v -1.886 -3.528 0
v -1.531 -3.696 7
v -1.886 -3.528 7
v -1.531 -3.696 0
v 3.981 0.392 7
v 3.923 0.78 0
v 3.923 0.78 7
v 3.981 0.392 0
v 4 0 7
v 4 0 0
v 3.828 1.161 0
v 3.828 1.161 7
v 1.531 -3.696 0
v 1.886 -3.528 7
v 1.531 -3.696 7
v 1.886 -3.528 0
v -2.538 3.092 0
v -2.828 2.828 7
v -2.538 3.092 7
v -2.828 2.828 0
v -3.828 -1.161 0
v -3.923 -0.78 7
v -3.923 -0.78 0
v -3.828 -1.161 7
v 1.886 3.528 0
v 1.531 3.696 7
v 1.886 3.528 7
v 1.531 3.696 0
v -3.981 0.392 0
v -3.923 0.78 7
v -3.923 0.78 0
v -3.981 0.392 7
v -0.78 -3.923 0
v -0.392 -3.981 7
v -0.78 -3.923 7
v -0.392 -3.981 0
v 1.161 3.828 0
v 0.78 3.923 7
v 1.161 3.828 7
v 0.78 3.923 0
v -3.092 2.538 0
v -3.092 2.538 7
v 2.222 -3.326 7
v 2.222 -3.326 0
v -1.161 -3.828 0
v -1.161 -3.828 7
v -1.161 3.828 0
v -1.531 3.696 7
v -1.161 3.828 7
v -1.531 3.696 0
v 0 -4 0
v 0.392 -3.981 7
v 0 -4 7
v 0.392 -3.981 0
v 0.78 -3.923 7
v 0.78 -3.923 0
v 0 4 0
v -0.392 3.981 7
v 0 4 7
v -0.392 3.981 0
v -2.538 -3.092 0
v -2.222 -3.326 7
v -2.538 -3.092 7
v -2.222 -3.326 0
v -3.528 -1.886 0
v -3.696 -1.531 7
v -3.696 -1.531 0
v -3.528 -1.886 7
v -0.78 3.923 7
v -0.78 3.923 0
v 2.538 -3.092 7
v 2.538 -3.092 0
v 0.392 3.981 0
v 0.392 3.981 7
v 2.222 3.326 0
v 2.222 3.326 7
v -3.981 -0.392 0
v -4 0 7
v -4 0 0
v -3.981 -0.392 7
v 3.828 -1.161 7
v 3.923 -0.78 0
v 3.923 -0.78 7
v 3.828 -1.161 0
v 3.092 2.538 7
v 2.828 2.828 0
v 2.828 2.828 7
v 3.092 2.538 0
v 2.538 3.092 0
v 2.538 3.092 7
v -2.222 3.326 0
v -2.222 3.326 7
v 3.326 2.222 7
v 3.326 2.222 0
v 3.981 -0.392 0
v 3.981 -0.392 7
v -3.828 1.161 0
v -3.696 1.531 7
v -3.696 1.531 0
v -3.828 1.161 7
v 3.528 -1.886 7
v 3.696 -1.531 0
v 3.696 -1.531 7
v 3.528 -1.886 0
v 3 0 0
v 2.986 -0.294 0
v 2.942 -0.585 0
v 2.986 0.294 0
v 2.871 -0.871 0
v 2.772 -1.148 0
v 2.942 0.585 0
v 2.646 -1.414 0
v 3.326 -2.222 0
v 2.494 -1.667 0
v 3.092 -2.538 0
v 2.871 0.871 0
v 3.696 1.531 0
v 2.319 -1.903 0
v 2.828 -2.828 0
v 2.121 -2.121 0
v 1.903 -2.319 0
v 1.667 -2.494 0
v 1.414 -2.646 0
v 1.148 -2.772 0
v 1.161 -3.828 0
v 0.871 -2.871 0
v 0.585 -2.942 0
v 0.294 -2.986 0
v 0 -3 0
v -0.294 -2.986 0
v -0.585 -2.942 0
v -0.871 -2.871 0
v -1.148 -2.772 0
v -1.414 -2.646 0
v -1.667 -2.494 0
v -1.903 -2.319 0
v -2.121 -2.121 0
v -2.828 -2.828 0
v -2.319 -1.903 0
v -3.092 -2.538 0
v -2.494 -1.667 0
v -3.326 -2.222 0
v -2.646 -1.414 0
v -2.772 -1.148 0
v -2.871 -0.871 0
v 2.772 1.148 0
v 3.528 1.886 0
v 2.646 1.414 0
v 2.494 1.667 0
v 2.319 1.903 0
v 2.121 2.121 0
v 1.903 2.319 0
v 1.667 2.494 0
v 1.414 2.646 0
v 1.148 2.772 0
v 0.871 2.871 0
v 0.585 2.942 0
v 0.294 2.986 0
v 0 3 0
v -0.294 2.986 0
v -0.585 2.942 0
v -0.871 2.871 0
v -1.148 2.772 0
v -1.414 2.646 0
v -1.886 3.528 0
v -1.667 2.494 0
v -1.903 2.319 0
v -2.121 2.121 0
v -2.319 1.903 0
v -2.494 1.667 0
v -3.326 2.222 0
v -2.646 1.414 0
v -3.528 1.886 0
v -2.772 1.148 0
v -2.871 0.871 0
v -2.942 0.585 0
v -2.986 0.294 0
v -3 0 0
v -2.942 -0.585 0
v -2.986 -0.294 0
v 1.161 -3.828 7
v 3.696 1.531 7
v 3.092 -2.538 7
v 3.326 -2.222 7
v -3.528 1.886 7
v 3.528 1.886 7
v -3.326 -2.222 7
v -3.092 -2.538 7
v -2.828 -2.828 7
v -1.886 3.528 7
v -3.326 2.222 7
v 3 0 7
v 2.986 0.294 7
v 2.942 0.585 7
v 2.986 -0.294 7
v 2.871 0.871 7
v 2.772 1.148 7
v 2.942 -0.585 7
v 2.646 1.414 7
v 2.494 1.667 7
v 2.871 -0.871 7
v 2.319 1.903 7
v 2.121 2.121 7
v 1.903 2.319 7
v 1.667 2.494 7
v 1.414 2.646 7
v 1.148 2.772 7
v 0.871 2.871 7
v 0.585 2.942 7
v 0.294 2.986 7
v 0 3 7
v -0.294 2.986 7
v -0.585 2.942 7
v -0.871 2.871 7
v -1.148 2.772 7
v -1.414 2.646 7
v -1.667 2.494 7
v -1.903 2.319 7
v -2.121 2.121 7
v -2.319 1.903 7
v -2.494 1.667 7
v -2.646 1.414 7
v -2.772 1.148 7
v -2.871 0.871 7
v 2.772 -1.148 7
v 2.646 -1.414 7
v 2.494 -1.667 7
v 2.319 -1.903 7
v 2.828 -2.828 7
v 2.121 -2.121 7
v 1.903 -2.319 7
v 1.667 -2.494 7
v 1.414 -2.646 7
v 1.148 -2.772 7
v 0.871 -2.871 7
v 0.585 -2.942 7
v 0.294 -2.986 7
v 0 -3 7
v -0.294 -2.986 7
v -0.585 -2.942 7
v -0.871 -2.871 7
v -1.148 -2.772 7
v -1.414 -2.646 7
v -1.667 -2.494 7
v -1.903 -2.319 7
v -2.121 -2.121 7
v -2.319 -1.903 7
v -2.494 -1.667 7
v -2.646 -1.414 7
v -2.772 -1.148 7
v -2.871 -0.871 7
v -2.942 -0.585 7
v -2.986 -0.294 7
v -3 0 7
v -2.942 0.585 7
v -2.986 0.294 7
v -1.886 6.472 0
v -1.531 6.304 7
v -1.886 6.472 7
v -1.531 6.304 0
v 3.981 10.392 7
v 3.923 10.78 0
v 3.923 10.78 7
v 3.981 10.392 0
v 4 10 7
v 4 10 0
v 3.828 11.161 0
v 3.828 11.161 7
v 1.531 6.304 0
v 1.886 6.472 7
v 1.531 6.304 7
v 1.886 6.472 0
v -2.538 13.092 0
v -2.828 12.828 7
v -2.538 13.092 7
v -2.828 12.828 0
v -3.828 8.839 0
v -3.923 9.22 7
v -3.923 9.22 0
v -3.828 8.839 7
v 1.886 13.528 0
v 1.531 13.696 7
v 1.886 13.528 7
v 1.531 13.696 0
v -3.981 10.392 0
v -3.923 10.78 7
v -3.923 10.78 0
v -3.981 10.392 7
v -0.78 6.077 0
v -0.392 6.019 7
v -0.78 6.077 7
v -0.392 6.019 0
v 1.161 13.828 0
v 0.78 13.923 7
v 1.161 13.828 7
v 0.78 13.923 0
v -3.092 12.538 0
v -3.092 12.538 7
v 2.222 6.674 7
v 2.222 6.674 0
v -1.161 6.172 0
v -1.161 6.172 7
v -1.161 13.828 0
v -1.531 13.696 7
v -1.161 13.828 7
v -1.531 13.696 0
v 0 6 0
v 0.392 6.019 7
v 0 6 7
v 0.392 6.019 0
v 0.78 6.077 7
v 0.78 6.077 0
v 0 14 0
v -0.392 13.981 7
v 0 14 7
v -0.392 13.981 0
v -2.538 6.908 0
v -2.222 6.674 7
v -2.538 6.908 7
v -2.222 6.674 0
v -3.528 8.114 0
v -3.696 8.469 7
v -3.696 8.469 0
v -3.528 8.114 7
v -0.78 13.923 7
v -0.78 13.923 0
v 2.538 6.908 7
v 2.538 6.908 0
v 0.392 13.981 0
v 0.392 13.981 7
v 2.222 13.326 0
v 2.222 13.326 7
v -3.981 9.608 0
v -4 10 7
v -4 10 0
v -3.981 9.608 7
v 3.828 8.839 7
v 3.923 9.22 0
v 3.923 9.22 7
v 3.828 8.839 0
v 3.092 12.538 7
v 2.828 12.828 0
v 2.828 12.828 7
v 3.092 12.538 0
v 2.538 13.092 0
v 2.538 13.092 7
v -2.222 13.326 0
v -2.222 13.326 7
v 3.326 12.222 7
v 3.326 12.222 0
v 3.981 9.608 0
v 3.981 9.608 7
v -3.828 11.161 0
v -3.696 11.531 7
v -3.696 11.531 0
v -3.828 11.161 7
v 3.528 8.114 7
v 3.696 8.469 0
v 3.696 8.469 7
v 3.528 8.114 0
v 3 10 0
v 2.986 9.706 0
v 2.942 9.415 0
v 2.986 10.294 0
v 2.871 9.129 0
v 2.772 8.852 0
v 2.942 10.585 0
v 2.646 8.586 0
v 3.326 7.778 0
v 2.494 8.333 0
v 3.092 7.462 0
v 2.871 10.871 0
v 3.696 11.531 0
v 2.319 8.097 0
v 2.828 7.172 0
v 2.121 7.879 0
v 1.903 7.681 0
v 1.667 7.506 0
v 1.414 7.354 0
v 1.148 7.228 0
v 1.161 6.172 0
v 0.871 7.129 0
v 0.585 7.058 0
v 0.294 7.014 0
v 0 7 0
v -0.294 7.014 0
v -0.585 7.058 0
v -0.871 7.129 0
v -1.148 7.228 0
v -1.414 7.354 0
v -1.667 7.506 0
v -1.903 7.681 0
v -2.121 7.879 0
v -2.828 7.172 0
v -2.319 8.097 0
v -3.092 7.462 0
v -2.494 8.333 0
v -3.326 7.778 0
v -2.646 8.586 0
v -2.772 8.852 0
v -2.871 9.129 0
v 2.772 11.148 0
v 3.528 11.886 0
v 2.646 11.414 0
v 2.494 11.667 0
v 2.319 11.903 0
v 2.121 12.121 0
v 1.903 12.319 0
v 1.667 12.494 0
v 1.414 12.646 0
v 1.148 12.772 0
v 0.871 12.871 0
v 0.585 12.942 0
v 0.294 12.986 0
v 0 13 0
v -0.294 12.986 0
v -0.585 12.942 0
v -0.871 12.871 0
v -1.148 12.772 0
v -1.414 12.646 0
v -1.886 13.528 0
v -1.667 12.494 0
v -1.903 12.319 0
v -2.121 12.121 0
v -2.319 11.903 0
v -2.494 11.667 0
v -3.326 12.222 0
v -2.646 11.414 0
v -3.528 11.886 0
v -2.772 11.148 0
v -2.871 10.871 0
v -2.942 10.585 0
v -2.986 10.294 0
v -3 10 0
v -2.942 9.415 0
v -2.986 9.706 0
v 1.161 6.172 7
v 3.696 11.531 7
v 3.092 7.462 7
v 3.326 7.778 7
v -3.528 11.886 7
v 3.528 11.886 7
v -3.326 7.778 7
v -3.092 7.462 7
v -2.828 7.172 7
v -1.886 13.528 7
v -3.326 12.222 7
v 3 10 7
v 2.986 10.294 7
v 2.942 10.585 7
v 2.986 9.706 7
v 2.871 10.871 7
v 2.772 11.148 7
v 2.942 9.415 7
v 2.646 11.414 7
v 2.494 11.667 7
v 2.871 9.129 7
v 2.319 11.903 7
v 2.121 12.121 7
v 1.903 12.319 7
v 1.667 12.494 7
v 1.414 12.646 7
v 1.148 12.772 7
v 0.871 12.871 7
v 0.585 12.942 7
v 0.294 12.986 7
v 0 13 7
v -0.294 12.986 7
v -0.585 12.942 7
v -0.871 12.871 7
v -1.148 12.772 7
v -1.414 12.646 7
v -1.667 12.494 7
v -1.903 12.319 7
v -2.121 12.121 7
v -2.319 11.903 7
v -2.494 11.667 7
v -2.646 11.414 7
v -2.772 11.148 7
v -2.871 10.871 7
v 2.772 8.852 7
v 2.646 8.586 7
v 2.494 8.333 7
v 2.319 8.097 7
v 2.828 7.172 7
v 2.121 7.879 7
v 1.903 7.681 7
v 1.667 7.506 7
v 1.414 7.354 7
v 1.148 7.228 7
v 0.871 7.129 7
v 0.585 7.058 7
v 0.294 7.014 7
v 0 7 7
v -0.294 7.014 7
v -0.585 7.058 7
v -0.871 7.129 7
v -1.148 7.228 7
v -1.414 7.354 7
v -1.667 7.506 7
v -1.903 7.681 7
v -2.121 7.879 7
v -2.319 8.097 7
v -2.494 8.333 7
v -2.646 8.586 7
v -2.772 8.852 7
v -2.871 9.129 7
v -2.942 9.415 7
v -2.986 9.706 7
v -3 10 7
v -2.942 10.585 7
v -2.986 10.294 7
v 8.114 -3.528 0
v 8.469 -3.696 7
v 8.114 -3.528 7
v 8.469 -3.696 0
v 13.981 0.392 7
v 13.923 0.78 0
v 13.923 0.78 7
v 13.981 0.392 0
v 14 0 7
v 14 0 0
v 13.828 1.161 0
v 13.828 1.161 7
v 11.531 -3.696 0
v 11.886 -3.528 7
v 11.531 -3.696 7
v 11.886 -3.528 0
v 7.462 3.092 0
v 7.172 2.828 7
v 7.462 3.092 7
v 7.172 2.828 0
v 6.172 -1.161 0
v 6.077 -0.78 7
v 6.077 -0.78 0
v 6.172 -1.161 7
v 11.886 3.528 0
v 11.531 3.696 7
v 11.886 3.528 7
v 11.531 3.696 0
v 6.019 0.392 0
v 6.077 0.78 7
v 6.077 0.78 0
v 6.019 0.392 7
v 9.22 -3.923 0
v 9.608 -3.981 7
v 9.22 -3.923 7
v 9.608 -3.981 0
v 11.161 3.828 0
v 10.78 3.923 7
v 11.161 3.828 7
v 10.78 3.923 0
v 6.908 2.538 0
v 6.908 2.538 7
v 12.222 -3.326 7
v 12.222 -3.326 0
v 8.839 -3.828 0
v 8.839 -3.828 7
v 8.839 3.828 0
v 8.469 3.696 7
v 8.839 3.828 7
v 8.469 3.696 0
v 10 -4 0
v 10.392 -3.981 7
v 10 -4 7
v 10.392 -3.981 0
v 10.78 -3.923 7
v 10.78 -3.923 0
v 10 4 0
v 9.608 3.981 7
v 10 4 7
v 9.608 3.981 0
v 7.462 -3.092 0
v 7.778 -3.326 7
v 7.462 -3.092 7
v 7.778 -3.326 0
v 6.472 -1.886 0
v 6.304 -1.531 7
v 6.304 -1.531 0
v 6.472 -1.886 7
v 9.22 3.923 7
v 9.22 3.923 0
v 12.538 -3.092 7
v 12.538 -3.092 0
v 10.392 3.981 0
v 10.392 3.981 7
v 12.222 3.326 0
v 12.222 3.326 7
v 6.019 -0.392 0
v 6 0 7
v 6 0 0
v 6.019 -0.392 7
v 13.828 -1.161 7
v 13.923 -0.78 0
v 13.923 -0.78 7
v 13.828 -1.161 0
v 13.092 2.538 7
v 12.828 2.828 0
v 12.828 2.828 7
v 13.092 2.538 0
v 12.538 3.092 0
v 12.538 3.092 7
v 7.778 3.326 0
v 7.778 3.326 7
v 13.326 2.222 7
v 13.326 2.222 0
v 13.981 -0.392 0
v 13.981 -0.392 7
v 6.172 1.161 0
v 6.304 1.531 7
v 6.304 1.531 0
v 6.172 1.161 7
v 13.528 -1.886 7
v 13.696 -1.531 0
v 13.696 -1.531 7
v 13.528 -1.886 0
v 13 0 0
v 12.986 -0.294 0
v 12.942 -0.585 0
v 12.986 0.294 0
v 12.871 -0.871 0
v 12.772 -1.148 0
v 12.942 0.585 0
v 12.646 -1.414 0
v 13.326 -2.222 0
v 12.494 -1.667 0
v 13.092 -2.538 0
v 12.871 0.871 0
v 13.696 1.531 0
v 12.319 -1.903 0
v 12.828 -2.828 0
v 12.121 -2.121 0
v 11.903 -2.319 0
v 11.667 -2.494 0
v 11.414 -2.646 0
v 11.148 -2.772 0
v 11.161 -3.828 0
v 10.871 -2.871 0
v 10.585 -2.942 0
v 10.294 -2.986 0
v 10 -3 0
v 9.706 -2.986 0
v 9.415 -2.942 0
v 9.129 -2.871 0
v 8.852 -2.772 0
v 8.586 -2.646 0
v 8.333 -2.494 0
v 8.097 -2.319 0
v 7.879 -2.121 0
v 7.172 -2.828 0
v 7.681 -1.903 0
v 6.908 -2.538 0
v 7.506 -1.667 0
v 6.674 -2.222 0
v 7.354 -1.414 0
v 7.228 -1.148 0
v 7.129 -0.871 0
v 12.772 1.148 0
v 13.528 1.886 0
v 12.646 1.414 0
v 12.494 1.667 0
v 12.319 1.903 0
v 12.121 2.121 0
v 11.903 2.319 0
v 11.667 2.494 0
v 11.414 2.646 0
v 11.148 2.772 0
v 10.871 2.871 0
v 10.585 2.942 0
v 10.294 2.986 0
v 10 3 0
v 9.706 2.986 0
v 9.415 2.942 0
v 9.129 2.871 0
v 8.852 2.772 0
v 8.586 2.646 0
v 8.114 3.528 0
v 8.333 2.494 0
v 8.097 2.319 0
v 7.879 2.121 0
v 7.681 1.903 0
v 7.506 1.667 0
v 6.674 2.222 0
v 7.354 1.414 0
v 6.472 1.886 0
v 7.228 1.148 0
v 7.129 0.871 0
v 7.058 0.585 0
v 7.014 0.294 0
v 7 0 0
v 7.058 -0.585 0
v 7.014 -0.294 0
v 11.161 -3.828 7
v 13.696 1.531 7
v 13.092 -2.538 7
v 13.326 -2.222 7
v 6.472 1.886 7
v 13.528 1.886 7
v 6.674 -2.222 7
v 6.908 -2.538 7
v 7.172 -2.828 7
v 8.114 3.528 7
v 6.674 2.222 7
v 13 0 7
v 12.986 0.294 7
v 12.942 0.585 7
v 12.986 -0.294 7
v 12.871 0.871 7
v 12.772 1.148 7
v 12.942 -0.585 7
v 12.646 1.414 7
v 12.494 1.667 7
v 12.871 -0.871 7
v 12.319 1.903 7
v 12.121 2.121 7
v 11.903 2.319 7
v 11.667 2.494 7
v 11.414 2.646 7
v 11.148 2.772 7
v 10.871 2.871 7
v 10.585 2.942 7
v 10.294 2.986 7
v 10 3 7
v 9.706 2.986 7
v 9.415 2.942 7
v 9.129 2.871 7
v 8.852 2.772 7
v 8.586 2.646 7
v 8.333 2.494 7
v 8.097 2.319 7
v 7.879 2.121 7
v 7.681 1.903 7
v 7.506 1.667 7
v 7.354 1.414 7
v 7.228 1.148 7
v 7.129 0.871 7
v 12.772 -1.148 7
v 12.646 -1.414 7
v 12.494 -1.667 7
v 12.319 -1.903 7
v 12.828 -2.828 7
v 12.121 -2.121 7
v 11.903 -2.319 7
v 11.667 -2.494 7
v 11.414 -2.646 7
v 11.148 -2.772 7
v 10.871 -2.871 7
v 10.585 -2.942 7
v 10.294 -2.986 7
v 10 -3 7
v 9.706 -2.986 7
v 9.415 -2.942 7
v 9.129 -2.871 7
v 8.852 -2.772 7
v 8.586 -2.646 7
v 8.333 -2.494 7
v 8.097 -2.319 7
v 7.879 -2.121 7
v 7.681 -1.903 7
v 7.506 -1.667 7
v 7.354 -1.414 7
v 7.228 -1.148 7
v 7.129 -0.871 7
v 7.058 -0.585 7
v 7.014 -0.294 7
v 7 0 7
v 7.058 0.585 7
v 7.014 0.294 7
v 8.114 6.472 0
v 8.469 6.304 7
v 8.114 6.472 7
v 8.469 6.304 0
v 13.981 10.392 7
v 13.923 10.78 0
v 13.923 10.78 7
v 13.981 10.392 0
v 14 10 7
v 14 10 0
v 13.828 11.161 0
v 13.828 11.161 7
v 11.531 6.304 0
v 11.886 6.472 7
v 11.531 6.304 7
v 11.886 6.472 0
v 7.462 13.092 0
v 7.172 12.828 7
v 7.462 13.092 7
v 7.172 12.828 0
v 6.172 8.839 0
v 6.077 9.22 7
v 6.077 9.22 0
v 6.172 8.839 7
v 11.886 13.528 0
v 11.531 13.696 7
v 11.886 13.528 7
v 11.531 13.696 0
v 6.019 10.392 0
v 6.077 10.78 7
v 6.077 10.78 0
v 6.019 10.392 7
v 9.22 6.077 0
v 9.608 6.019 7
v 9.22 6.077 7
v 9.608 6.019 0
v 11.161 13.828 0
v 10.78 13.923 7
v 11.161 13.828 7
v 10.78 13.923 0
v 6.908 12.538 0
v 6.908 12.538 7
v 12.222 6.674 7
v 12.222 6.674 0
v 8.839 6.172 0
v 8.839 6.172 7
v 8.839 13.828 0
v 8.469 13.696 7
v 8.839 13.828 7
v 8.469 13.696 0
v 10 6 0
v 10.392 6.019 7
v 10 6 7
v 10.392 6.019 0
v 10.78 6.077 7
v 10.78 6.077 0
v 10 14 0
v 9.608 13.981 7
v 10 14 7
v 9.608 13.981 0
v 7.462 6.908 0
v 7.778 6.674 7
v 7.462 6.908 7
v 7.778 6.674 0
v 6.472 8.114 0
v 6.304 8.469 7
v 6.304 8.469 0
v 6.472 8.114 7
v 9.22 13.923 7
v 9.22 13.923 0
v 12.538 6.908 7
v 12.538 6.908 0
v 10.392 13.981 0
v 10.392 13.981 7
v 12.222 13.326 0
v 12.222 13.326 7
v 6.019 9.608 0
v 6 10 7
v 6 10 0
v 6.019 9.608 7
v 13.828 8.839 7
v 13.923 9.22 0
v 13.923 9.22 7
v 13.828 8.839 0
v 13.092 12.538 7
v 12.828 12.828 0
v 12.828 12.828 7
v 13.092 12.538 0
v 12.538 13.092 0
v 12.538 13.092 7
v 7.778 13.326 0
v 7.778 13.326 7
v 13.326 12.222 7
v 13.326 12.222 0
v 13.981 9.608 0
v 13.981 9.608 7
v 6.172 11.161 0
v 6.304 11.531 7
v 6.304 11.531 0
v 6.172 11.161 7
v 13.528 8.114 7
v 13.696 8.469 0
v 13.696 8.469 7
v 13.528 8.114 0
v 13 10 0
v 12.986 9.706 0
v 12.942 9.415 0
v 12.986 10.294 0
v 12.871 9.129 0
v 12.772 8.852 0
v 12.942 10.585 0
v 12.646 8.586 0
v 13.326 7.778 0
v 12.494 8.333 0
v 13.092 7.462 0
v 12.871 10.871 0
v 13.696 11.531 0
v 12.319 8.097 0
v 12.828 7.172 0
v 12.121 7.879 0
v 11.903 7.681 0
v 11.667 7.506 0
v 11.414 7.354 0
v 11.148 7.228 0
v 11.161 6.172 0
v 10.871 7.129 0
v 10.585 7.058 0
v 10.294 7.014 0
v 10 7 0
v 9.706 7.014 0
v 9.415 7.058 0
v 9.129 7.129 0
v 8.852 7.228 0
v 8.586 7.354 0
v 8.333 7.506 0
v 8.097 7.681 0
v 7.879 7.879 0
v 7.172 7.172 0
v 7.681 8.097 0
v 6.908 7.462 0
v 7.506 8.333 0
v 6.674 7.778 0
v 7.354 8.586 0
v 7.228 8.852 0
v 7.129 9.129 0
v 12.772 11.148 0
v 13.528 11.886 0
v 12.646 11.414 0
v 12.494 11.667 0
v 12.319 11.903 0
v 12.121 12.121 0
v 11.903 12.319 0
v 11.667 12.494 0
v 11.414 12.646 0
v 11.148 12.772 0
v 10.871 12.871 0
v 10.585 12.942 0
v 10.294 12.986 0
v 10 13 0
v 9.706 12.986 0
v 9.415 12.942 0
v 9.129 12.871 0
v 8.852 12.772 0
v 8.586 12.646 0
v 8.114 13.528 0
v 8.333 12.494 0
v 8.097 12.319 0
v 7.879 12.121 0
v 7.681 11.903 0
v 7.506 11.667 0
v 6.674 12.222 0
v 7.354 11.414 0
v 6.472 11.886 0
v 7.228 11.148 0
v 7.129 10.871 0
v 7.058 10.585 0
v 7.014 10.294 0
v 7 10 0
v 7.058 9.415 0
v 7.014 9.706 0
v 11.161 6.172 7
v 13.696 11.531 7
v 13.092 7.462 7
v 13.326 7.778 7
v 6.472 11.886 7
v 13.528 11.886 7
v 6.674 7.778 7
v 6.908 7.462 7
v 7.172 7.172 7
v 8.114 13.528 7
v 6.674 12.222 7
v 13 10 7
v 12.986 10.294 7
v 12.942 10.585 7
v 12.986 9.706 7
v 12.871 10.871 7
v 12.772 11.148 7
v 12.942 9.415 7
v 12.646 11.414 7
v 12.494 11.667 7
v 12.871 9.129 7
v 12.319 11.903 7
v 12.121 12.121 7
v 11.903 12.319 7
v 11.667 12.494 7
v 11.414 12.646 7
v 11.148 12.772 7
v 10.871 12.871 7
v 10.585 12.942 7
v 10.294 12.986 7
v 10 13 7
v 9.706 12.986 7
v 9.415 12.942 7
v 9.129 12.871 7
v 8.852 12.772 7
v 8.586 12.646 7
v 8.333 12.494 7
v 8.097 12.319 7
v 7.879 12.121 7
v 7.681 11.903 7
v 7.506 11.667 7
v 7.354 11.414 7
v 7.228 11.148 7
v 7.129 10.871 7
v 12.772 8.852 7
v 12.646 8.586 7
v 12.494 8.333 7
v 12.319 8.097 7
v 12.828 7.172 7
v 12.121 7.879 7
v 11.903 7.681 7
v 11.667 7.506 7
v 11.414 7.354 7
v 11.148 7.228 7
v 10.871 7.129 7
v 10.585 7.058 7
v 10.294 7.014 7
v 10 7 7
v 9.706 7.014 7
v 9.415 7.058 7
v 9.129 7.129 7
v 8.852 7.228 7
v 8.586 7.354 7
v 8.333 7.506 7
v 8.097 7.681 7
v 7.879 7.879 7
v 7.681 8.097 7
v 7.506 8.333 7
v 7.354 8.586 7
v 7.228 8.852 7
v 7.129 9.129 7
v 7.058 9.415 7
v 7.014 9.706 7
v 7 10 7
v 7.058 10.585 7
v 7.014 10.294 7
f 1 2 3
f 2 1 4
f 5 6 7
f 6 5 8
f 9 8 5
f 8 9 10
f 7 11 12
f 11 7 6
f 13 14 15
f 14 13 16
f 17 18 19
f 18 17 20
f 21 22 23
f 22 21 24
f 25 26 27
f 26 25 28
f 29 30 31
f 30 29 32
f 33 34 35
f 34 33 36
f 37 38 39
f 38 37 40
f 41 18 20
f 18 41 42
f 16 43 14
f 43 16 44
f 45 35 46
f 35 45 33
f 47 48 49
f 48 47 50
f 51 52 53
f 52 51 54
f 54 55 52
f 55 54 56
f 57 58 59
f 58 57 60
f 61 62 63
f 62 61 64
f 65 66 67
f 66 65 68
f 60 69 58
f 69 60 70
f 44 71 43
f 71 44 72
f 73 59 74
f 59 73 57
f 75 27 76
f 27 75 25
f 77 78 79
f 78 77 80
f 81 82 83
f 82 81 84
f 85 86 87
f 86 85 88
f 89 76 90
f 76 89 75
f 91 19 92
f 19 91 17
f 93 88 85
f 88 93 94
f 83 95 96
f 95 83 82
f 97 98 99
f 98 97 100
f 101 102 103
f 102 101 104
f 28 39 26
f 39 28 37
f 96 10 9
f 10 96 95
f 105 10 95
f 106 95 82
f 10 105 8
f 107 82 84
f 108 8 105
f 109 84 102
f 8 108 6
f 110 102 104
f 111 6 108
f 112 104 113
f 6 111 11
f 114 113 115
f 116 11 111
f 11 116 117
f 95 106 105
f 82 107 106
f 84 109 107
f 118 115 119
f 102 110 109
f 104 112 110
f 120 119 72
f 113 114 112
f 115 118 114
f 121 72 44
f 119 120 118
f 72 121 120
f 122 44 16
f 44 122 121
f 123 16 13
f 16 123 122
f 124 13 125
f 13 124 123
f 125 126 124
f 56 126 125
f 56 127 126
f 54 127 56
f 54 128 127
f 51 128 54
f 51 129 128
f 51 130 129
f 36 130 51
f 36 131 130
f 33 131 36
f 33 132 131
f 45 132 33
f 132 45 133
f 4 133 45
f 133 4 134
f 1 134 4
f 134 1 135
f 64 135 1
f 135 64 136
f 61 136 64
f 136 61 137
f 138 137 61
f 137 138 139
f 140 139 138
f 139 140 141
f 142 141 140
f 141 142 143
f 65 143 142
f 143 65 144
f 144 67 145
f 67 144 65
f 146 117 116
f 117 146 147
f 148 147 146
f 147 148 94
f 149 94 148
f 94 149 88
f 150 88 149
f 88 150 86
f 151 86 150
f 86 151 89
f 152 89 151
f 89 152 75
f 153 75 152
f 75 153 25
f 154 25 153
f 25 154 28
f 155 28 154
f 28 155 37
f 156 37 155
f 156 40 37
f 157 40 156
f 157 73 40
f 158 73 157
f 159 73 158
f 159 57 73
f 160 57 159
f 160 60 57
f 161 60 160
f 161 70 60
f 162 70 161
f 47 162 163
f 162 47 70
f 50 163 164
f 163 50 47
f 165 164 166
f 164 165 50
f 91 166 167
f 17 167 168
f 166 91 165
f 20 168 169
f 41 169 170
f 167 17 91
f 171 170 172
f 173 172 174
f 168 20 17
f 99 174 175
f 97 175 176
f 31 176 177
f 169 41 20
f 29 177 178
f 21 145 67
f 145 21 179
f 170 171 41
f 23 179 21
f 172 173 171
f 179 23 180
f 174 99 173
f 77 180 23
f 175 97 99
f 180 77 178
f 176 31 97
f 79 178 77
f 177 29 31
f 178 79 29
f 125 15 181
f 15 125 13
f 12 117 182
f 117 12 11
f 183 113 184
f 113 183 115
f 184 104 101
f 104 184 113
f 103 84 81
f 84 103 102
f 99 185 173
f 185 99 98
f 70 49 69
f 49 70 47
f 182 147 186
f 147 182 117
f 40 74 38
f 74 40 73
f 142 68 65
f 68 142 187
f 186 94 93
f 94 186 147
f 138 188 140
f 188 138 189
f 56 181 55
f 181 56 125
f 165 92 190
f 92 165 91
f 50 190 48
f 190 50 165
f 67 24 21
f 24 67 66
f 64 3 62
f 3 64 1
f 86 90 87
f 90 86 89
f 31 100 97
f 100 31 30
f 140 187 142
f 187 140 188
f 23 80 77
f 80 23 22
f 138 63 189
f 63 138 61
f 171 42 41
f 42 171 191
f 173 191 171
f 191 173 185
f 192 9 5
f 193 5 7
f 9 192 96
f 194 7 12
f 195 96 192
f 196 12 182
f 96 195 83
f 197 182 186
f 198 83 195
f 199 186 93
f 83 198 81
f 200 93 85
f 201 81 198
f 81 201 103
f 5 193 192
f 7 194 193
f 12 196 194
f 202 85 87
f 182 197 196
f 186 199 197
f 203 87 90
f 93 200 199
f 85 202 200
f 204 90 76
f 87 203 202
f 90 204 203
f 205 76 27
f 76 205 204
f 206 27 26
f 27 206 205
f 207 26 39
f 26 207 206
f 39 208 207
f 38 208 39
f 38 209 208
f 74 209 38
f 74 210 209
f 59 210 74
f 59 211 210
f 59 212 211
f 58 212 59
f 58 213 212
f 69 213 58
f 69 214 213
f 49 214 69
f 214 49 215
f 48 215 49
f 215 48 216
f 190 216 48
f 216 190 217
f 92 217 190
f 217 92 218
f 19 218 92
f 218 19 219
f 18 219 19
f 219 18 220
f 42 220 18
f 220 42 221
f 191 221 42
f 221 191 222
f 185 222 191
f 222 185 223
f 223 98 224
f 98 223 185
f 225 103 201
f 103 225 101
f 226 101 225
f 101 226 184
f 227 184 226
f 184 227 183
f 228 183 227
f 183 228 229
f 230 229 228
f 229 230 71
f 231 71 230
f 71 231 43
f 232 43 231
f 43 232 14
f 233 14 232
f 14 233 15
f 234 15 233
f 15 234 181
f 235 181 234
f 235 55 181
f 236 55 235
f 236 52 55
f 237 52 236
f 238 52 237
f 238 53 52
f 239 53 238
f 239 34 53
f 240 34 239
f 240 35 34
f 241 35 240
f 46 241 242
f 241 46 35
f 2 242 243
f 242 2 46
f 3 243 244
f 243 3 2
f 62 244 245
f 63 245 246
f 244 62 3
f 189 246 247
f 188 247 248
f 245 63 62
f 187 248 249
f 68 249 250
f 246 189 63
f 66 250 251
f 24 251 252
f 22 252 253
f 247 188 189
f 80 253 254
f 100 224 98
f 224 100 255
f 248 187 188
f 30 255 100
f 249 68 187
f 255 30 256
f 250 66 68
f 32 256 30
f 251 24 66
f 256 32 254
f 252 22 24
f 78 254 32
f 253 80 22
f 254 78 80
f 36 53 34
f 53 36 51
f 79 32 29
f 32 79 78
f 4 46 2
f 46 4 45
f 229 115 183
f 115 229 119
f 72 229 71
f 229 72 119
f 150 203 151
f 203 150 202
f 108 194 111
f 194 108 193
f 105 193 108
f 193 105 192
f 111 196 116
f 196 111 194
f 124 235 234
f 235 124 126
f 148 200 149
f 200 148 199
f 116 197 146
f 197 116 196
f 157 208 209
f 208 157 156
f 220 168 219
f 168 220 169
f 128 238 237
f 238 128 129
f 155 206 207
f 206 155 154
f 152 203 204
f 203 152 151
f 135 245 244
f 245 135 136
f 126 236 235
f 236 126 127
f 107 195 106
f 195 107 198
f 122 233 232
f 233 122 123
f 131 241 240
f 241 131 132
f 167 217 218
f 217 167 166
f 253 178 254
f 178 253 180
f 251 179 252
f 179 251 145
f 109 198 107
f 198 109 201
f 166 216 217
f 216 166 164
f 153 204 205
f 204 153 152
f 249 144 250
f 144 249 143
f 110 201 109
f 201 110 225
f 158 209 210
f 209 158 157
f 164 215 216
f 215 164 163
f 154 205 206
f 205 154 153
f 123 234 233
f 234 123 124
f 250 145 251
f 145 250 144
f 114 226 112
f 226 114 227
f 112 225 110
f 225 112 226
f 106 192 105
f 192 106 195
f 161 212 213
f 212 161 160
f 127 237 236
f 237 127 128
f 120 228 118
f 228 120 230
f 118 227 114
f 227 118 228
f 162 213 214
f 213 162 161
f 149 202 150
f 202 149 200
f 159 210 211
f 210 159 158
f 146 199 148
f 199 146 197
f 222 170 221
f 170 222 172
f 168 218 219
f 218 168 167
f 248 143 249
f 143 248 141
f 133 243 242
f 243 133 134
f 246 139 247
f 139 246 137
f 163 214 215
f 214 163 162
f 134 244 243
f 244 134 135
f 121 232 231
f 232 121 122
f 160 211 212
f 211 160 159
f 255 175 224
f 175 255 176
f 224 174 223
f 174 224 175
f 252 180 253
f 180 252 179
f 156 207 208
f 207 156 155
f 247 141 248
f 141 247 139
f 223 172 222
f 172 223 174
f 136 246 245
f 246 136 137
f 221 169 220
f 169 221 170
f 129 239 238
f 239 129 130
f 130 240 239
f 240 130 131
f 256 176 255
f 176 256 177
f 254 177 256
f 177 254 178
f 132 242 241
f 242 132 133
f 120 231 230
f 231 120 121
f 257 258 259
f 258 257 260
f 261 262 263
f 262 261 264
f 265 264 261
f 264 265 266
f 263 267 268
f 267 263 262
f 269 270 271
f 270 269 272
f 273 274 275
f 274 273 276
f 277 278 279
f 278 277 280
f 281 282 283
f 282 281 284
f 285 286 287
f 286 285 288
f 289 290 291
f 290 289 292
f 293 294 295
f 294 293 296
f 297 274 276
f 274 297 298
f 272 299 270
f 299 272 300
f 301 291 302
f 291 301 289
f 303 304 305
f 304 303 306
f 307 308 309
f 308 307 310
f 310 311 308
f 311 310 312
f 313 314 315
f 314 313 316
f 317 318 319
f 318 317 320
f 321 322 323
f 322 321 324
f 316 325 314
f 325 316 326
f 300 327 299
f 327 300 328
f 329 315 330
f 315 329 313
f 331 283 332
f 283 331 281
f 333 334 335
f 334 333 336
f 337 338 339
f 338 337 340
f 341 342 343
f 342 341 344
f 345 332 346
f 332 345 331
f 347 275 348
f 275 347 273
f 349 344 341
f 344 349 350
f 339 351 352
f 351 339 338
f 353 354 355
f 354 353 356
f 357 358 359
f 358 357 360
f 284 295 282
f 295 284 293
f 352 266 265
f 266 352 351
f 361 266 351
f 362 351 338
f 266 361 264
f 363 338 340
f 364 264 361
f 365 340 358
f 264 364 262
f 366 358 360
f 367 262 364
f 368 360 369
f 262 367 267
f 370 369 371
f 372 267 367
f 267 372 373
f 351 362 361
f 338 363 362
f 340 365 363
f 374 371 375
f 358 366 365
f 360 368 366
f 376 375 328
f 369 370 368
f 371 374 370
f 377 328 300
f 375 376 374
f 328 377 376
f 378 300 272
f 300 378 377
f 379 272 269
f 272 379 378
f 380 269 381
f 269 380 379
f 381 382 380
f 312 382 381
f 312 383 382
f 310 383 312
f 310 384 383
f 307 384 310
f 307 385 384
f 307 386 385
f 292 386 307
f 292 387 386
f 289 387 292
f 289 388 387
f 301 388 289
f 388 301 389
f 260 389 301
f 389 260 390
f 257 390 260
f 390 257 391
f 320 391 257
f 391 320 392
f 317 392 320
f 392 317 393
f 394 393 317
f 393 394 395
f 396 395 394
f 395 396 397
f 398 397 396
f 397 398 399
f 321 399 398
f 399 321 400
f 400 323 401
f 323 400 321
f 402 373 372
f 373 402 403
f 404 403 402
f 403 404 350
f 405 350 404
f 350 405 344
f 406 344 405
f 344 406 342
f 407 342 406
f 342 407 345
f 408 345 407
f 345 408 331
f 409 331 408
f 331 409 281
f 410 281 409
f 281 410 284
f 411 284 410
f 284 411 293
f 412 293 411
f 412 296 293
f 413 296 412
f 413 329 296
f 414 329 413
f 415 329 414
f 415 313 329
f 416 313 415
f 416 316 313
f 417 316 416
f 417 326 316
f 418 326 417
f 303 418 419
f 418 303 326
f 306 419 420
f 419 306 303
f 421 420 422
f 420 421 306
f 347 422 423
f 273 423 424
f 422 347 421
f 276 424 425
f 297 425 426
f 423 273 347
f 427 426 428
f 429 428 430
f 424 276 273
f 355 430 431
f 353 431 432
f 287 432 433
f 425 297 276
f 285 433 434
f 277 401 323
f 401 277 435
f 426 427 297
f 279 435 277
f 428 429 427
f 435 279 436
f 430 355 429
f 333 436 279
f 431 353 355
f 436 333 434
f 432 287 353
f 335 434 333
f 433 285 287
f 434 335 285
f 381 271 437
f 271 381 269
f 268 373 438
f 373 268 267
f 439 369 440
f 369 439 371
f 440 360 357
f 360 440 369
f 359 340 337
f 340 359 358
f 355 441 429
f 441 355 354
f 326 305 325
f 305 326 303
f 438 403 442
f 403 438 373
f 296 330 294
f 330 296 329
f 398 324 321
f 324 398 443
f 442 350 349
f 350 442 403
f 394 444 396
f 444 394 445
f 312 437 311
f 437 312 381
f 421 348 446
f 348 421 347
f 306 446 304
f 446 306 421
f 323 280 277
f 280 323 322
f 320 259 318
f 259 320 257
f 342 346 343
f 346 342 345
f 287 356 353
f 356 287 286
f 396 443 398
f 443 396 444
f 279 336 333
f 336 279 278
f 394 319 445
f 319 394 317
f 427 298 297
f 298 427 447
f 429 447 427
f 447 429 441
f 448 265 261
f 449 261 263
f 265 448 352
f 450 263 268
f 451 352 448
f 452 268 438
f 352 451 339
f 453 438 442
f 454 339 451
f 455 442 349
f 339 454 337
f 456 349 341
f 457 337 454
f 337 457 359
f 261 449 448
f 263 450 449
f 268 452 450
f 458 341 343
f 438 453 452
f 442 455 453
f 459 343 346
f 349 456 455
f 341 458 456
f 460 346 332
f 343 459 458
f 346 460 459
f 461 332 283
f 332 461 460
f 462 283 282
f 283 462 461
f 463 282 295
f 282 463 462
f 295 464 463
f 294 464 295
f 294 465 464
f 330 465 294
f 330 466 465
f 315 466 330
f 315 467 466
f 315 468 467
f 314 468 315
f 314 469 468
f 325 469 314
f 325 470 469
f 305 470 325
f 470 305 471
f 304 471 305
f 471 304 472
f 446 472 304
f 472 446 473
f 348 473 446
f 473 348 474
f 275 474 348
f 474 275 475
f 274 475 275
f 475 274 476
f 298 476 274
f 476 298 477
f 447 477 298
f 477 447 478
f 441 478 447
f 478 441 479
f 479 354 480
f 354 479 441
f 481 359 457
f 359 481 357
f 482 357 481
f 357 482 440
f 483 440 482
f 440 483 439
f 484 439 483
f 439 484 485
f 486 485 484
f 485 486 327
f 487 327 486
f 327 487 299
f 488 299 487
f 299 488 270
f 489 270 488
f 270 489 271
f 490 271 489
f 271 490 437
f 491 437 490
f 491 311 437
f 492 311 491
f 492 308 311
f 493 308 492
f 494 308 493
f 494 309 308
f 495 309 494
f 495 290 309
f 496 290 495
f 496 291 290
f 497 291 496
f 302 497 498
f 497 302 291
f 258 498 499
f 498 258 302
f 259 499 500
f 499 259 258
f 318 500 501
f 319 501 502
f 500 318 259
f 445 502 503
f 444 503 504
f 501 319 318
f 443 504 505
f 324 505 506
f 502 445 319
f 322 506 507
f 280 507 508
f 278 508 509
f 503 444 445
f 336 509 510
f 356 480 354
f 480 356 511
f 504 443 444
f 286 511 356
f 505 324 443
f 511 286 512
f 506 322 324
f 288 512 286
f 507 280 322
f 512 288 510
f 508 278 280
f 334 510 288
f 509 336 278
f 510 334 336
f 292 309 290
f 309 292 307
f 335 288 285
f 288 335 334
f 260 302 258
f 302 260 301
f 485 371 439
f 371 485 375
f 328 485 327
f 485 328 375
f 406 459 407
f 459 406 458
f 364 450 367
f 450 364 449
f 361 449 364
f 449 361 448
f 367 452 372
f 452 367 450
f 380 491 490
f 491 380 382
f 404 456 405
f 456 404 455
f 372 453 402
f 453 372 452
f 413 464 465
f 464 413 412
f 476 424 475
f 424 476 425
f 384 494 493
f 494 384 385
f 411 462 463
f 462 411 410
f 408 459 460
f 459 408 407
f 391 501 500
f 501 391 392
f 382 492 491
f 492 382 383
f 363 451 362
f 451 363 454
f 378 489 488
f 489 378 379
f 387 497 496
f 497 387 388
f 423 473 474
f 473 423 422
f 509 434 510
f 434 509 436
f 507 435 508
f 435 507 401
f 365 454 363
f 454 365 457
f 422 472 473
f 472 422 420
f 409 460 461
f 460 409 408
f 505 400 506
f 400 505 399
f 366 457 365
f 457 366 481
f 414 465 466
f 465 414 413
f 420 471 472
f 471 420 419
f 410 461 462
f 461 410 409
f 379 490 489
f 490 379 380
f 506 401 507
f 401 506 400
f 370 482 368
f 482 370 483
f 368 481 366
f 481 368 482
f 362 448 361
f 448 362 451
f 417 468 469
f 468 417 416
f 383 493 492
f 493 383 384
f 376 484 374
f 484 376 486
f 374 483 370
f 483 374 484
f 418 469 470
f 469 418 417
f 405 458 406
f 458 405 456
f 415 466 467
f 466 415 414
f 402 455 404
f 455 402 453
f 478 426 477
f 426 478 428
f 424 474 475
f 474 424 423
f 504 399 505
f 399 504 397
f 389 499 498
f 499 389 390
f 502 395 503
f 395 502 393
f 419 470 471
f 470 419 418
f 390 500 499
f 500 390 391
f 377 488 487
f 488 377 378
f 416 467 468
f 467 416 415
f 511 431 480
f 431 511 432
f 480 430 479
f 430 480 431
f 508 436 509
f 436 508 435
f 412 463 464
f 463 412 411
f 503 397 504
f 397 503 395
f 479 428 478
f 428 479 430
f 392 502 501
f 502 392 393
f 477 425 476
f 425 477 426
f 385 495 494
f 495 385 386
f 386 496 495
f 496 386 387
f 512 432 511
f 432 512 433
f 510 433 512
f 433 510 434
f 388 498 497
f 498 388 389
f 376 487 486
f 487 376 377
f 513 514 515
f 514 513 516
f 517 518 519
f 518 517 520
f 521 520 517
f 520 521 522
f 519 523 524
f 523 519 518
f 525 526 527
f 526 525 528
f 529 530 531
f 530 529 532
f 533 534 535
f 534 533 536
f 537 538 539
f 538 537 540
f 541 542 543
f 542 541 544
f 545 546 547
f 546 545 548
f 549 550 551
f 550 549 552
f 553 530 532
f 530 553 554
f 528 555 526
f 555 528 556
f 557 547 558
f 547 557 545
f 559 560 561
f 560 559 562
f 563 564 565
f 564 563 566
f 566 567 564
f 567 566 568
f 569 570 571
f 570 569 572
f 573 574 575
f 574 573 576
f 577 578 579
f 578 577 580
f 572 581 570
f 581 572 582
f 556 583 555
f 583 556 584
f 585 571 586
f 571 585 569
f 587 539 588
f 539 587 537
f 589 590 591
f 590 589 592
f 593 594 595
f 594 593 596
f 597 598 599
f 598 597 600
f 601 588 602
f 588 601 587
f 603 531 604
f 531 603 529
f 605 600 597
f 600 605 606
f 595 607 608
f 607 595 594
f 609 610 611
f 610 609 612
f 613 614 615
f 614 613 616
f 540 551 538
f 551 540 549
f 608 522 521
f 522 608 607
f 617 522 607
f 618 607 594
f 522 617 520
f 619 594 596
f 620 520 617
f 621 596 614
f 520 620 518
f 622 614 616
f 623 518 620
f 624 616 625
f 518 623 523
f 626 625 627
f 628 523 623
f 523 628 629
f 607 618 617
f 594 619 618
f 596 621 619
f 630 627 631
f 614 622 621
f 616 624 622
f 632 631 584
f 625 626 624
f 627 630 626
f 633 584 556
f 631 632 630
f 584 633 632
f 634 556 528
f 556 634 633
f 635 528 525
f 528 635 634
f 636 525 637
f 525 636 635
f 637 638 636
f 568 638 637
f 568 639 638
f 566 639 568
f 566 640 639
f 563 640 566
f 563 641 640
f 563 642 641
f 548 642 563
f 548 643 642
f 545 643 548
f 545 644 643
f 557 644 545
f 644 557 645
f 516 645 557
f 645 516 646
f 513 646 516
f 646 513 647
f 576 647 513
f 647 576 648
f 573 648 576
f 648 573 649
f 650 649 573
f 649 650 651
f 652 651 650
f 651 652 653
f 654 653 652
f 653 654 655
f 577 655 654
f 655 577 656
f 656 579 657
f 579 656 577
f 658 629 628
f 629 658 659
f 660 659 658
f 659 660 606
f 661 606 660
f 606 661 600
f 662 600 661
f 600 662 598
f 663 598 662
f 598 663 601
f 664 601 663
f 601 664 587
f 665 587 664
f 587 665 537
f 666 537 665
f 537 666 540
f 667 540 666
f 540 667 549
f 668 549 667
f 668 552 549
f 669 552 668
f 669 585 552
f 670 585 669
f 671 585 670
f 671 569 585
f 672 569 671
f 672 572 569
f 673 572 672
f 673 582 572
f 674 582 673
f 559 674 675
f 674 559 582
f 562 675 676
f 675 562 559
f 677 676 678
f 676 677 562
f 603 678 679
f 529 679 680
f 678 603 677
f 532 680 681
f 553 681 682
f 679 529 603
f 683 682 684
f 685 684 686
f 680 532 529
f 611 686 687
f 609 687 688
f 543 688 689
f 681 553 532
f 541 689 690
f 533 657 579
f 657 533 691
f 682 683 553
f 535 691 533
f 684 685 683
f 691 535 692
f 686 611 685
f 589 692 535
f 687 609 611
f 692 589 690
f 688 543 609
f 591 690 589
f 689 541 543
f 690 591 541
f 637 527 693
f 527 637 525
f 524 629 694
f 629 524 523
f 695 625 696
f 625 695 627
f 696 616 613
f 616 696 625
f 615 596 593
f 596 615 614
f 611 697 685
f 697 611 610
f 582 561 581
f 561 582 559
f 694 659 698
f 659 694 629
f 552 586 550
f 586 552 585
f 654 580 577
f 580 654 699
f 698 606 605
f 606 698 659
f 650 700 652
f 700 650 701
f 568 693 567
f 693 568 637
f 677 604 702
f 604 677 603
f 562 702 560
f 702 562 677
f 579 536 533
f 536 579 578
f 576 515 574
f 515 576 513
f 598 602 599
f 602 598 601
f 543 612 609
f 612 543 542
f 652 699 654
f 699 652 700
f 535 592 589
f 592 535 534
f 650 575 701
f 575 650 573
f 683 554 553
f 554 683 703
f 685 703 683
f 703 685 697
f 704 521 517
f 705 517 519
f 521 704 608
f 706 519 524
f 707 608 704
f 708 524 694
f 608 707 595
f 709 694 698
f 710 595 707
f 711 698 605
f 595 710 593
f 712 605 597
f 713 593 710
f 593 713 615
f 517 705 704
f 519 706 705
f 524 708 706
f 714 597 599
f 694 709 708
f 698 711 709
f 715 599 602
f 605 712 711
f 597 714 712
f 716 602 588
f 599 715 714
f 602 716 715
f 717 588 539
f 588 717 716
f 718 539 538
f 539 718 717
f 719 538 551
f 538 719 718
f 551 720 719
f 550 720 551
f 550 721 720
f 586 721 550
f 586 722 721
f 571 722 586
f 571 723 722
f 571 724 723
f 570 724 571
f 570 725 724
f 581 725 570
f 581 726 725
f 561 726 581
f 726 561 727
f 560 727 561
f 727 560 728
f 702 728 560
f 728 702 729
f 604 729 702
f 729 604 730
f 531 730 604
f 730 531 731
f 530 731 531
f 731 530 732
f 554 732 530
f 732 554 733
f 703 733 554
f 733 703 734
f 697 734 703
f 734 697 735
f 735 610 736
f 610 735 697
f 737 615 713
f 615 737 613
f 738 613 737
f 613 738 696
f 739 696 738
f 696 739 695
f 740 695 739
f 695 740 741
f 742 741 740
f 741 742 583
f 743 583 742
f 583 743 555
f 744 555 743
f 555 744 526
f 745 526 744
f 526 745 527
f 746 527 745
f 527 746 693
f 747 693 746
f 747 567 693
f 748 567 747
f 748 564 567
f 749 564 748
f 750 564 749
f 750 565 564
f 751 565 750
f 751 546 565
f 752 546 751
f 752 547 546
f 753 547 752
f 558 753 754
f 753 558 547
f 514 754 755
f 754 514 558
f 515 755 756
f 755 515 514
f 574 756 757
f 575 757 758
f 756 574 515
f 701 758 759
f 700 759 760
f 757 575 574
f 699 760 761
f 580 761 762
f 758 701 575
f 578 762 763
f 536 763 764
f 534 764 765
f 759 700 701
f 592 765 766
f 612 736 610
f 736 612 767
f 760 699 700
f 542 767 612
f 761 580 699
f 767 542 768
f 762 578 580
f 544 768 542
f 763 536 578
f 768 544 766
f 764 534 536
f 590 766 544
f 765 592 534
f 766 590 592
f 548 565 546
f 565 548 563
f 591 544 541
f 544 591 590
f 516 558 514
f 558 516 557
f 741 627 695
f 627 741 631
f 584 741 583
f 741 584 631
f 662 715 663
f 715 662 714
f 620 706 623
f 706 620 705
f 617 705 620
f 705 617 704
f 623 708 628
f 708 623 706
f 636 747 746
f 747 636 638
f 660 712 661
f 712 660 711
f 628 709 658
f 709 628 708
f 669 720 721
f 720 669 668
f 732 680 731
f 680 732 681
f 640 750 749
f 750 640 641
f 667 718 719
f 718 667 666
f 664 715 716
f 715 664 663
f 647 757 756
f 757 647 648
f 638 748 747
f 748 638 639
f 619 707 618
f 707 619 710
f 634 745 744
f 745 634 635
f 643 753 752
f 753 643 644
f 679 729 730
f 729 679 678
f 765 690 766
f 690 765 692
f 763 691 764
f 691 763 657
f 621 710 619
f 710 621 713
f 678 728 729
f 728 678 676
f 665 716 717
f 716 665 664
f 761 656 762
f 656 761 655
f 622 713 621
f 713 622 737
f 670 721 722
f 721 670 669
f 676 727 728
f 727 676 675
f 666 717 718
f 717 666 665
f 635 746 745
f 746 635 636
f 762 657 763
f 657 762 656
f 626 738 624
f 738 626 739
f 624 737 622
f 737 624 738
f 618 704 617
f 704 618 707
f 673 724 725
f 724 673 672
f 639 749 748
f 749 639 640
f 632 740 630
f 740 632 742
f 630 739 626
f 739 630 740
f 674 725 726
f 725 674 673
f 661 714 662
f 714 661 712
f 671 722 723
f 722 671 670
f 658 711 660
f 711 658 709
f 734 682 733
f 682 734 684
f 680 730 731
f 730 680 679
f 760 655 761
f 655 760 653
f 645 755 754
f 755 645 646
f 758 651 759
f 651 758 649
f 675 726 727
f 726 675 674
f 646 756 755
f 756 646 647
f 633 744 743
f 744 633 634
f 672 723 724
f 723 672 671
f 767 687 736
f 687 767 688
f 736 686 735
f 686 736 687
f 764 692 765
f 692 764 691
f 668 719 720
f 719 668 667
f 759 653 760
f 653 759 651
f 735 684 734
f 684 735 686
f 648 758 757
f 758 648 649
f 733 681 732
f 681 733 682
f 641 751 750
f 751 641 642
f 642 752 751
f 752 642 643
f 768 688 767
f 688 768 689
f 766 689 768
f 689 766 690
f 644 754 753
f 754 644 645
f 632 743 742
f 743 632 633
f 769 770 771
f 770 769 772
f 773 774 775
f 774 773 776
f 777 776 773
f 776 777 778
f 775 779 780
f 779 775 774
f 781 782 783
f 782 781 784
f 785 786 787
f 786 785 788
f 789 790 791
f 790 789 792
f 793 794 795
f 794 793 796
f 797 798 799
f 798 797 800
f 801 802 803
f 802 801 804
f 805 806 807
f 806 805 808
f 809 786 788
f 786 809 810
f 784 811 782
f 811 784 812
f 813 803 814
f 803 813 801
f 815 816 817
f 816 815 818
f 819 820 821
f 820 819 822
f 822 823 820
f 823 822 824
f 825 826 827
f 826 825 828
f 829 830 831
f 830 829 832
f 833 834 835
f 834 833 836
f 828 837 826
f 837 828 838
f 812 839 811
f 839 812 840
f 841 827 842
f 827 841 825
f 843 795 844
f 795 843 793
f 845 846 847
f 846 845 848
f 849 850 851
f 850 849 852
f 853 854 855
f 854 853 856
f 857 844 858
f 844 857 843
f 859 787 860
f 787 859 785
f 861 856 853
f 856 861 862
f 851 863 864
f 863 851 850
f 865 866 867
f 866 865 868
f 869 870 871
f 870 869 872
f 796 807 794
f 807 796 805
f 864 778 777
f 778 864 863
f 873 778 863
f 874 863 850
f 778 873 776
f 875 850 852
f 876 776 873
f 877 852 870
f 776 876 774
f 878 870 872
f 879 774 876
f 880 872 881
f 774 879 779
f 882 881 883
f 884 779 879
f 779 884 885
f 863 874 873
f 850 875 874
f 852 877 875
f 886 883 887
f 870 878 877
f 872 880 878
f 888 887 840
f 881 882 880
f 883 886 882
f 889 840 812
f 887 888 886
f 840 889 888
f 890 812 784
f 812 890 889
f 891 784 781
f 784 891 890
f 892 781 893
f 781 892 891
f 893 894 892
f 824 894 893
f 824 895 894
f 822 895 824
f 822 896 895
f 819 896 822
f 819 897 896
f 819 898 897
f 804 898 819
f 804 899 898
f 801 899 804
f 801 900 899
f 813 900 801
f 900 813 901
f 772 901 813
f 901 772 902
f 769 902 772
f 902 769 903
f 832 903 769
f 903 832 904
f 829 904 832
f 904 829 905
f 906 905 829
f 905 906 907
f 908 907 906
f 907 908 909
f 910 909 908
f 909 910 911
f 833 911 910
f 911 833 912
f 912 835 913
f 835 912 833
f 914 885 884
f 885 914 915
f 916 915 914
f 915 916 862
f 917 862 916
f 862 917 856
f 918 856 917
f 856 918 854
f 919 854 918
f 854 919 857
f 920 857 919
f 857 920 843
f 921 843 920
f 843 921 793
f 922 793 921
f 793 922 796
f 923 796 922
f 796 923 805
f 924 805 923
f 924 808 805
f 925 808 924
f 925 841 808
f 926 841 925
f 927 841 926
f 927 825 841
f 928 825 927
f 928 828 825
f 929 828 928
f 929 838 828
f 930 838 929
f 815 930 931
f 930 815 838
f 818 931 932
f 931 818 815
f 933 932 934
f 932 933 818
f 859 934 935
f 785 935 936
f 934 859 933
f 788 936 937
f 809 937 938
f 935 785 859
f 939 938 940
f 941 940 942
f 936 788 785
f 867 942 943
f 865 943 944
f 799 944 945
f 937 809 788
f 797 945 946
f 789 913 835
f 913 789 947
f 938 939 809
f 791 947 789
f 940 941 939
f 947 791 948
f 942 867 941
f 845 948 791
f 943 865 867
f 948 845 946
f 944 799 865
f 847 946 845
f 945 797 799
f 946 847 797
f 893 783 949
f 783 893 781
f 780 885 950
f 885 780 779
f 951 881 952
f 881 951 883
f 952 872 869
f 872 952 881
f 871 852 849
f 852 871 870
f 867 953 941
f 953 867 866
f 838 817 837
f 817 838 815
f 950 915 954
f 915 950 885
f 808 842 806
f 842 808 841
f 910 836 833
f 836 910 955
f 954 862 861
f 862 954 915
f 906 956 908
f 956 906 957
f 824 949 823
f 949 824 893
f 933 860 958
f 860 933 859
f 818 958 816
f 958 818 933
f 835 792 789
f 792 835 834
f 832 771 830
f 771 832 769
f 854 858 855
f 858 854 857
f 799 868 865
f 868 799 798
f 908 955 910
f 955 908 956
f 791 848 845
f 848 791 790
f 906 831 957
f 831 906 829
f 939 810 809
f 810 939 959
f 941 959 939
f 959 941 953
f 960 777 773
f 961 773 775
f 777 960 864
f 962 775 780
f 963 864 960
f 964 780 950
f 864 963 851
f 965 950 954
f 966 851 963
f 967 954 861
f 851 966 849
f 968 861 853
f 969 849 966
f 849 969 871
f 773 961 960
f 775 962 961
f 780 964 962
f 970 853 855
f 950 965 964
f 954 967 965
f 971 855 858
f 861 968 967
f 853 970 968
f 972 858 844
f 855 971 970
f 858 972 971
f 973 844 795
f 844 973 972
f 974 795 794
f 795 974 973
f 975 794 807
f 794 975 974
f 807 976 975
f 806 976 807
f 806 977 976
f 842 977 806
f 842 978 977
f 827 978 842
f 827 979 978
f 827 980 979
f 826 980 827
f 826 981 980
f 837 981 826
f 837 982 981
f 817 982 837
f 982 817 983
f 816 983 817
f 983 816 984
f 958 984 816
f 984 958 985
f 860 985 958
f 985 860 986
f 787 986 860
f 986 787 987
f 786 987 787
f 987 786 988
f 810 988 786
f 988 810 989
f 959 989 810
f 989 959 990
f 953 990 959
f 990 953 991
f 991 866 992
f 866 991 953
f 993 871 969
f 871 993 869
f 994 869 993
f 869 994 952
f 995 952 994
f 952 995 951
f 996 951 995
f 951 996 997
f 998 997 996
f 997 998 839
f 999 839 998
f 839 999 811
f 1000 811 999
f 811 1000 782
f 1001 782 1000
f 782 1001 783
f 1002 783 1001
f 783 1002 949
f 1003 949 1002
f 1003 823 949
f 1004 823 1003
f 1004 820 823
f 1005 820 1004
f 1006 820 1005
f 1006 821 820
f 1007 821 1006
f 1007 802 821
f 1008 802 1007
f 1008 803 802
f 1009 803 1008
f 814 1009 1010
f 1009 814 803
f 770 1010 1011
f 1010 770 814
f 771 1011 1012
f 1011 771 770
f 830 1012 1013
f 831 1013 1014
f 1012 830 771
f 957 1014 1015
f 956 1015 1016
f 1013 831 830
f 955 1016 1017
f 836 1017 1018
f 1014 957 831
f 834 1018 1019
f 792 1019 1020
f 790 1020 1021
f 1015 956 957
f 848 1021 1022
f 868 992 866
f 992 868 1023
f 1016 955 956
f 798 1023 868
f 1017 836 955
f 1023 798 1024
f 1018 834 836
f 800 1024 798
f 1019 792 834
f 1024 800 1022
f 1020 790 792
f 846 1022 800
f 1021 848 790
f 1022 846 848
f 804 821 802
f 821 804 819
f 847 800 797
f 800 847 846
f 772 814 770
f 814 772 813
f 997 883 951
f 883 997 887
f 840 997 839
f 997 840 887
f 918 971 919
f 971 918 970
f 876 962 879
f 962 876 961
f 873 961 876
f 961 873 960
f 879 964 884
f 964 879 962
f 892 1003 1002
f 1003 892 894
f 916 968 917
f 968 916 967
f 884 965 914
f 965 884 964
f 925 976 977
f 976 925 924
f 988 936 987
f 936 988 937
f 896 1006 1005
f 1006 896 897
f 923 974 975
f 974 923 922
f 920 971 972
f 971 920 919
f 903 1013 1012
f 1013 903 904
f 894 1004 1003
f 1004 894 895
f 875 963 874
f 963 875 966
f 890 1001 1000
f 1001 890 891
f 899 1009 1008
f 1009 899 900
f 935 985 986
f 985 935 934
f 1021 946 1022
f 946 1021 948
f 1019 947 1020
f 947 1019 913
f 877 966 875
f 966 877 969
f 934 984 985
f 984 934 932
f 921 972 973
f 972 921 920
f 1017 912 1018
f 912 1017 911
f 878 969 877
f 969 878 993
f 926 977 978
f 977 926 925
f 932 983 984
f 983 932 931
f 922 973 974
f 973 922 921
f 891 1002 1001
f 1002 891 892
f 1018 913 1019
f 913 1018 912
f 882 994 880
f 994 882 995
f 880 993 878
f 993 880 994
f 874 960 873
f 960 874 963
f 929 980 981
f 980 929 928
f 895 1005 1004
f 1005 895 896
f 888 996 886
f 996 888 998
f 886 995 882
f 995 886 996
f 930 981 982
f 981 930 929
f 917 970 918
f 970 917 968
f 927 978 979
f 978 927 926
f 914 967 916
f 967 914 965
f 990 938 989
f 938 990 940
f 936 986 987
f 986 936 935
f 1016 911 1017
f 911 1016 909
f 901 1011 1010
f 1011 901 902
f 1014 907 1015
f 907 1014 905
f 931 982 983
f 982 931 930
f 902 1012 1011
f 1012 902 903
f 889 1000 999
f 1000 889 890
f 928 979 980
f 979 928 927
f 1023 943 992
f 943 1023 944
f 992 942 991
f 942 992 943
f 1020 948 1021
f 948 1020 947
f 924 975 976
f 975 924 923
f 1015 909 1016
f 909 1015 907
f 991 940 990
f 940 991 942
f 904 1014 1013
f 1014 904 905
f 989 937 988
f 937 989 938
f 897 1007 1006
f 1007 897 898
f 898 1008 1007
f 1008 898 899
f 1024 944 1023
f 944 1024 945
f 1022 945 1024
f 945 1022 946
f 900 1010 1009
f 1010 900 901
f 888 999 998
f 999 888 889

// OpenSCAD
// Makes spacers with the given id, od, and h


id = 6;
od = 8;
h = 7;

x_count = 2;
y_count = 2;

$fn = 64;

for(x=[1:x_count]) for(y=[1:y_count]) {
  translate([(x-1)*(od+2),(y-1)*(od+2),h/2])
  difference() {
    cylinder(d=od, h=h, center=true);
    cylinder(d=id, h=h+1, center=true);
  }
}
